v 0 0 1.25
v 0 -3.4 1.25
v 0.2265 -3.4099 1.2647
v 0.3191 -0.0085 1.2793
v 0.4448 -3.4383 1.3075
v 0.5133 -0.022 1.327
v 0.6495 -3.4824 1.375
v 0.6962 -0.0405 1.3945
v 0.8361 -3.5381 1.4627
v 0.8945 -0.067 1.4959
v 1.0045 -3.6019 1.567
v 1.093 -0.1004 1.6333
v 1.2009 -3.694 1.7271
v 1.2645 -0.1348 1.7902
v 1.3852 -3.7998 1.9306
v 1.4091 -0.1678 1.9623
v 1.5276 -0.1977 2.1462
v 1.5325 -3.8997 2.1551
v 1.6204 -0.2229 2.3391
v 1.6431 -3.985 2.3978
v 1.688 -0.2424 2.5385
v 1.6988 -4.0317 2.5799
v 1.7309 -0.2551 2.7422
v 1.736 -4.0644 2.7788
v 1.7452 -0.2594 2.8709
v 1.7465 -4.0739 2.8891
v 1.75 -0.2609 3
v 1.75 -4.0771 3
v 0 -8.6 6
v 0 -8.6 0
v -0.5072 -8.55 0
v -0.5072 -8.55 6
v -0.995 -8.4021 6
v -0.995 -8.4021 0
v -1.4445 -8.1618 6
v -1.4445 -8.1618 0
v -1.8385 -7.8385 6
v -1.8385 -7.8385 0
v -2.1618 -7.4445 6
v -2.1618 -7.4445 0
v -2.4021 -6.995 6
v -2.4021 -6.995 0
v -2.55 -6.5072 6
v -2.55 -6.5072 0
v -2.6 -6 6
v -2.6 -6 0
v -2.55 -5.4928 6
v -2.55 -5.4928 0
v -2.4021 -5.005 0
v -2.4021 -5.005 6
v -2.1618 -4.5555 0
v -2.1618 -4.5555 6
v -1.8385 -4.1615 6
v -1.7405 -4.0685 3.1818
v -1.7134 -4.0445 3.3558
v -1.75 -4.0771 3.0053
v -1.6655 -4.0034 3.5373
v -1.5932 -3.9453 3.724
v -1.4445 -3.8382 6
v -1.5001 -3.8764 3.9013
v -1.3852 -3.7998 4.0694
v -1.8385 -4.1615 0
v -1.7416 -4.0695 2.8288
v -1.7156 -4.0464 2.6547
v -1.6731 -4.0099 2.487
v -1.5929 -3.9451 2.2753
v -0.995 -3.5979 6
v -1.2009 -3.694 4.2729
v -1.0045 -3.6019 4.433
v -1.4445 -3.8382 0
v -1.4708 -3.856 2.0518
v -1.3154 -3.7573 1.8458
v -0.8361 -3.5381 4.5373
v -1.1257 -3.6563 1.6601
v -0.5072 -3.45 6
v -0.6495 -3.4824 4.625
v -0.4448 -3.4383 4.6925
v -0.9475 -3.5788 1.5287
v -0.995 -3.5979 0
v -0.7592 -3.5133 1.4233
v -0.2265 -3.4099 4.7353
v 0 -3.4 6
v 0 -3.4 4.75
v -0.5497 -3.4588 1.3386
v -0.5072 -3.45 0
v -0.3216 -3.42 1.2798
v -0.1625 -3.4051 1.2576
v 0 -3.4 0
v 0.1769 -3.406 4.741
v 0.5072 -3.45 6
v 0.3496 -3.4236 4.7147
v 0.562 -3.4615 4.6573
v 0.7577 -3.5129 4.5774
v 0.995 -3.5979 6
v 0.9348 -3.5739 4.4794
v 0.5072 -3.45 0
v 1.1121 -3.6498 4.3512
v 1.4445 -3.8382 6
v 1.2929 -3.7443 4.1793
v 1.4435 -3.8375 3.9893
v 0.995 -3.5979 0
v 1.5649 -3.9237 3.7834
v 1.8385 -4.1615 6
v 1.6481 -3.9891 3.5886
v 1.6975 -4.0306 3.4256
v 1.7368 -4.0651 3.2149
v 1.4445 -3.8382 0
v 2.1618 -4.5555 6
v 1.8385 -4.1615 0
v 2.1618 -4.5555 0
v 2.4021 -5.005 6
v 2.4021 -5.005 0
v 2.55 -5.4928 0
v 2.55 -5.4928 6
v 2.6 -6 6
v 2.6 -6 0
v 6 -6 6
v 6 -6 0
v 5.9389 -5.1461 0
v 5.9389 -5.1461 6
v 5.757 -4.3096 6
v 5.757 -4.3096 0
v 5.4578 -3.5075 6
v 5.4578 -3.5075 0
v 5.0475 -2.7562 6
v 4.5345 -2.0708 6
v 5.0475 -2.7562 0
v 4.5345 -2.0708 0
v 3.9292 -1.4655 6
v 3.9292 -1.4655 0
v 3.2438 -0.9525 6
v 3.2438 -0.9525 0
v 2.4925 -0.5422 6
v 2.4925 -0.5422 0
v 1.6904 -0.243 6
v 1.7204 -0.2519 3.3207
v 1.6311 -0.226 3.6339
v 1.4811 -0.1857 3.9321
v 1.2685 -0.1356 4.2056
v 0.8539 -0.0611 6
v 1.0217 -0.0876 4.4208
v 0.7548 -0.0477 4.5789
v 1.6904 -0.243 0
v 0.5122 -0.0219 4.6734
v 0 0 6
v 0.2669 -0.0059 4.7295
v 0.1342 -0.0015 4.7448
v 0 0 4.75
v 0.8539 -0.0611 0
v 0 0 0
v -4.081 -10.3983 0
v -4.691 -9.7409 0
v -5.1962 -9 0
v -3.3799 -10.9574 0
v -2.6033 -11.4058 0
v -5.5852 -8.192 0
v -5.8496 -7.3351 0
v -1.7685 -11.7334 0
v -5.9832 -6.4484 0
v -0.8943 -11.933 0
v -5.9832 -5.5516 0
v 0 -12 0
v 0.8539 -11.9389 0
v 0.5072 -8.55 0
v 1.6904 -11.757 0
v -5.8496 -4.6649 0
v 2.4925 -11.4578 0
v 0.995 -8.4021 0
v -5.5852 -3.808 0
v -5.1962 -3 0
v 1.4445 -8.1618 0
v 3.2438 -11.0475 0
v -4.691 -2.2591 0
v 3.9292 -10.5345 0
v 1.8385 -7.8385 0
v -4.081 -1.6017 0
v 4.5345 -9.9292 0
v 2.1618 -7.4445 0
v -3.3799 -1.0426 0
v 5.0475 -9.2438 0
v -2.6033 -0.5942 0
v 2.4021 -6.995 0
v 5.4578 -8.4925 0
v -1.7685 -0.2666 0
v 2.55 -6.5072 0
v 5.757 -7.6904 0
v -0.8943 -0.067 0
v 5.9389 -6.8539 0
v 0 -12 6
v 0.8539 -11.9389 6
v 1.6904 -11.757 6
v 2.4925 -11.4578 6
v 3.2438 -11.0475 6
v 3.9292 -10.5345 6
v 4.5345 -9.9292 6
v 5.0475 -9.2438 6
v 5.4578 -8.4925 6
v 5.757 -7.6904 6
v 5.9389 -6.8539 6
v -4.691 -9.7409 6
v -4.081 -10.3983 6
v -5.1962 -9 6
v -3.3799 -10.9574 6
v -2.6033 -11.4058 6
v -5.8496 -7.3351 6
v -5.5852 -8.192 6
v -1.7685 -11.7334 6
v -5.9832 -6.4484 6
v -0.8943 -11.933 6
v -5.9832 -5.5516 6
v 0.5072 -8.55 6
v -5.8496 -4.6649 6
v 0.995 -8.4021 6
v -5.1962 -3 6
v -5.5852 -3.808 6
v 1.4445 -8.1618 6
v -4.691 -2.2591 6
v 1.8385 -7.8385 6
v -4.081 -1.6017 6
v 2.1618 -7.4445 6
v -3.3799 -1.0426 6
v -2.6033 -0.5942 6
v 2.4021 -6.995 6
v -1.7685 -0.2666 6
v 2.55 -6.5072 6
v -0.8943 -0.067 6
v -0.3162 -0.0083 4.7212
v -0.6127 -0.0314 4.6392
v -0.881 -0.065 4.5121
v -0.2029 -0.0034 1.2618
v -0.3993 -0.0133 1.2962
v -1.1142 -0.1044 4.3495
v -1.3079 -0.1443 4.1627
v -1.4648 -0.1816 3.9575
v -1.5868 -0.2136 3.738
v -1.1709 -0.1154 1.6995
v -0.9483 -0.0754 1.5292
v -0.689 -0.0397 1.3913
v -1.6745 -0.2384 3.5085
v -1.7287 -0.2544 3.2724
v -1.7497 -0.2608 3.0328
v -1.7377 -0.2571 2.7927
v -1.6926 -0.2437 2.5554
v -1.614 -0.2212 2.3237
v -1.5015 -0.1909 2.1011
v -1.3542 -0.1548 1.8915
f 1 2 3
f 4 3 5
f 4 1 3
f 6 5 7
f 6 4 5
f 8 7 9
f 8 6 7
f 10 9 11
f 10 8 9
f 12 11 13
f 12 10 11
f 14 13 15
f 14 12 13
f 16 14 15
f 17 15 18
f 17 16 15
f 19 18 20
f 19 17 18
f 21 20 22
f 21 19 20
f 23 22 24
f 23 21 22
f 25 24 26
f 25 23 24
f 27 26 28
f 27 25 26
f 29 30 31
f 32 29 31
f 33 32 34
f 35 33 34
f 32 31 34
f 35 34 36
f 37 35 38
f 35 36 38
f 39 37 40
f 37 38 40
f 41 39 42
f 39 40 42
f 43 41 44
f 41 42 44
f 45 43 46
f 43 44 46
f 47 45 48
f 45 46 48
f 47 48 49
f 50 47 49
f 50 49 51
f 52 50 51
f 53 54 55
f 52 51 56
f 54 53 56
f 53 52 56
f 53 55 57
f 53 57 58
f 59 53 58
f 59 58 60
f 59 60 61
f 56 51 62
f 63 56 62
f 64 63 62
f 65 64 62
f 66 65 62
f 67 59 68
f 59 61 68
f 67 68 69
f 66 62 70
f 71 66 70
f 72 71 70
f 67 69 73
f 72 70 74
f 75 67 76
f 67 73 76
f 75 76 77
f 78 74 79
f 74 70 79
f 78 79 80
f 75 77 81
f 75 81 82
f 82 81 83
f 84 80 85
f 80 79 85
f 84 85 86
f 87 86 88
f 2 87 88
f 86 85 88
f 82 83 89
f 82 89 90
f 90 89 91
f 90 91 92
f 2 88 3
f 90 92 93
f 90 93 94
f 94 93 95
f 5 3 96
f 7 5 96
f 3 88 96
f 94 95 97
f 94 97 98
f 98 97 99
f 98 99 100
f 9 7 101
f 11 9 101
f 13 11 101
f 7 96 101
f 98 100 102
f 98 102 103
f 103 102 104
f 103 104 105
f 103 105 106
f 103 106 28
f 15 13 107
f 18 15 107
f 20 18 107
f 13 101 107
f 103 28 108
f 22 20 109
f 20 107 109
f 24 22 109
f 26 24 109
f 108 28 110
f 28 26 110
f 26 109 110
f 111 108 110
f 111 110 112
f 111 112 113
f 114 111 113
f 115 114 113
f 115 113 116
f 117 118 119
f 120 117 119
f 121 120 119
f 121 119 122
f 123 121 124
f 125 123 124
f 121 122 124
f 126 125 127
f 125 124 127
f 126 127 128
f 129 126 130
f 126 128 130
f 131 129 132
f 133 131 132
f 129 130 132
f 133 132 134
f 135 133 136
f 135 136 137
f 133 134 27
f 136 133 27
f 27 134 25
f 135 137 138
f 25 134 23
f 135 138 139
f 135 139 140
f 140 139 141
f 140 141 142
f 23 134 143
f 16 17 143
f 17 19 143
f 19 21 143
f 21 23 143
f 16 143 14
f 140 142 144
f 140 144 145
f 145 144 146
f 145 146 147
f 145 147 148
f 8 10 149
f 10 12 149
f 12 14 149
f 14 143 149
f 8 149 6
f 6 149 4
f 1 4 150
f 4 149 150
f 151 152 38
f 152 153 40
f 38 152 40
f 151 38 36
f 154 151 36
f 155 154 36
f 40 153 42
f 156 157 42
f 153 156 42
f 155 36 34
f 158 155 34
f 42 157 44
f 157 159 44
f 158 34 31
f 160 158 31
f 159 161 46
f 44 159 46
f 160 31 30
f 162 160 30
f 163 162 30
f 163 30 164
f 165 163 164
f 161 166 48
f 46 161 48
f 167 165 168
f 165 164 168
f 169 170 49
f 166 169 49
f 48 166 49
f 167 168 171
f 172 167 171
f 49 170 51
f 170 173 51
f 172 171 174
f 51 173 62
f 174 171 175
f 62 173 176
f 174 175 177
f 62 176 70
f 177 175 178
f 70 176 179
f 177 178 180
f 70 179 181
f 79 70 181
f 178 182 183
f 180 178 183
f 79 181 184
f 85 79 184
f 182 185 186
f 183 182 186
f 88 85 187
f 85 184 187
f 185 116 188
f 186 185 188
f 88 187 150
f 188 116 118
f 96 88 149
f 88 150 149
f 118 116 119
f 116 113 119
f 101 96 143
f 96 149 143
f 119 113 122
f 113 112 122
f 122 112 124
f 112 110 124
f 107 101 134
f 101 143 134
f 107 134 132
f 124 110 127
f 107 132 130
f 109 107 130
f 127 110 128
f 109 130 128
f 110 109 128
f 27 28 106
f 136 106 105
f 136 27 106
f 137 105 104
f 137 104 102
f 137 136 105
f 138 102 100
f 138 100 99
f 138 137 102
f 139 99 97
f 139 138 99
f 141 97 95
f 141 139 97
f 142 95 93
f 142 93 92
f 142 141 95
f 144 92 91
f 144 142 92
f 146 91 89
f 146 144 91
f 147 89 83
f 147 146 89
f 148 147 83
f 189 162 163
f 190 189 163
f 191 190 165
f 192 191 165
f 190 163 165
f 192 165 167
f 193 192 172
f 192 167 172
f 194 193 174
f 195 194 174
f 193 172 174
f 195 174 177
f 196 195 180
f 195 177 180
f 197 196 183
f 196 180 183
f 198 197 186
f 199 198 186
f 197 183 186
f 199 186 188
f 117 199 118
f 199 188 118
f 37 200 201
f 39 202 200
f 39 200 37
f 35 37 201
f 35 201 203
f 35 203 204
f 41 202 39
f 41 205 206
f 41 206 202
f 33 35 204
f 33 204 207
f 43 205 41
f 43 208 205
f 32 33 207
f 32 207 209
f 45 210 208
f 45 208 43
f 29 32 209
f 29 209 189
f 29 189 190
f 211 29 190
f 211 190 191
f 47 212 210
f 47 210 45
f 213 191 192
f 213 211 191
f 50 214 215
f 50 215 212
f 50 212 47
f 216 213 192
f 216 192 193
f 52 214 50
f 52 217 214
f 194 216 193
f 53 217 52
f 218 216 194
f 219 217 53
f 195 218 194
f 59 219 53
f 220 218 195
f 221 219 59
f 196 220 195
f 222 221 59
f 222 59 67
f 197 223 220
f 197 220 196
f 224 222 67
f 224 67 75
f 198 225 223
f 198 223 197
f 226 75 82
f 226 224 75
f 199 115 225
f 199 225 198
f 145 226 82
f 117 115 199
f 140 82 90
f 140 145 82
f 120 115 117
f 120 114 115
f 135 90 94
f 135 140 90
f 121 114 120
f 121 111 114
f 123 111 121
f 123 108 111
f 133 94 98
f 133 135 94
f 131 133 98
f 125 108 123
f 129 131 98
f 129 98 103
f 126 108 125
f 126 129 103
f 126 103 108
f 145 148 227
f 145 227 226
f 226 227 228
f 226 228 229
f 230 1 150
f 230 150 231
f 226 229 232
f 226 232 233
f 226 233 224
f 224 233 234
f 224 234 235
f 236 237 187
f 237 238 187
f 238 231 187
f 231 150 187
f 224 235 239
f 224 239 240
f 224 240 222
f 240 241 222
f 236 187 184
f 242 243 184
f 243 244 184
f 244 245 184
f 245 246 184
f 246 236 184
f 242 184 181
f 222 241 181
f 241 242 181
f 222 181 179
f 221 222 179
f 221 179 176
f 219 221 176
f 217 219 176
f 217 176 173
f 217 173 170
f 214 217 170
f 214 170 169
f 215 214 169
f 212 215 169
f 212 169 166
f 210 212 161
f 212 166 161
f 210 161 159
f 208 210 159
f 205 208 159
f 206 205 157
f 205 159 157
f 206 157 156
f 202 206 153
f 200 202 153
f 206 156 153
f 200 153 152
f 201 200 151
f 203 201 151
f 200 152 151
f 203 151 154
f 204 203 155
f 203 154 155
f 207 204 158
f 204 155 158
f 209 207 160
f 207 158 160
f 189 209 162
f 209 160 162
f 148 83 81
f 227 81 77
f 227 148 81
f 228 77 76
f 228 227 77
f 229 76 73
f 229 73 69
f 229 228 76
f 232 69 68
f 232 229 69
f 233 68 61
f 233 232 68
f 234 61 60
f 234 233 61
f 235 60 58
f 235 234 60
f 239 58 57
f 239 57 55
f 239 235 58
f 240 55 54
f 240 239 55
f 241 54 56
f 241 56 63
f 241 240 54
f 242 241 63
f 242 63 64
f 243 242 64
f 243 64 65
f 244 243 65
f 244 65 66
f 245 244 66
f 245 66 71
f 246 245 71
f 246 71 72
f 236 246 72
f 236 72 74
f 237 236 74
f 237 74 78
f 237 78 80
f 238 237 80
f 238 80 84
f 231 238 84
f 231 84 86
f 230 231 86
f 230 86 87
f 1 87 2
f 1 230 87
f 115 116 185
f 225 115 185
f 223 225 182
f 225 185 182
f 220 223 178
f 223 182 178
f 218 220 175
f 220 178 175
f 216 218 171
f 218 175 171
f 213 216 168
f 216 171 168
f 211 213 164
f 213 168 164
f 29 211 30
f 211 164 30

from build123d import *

# Parameters (mm, degrees)
F1_DEPTH = 6
F3_DEPTH = 5.9


with BuildPart() as f1:
    # F0 (on Top) → F1 (new body)
    with BuildSketch(Plane.XY):
        with BuildLine():
            ThreePointArc((6, -6), (4.2426406871, -1.7573593129), (0, 0))
            Line((0, 0), (0, -3.4))
            ThreePointArc((0, -3.4), (1.8384776311, -4.1615223689), (2.6, -6))
            ThreePointArc((2.6, -6), (1.8384776311, -7.8384776311), (0, -8.6))
            Line((0, -8.6), (0, -12))
            ThreePointArc((0, -12), (4.2426406871, -10.2426406871), (6, -6))
        make_face()
        with BuildLine():
            Line((0, -3.4), (0, 0))
            ThreePointArc((0, 0), (-6, -6), (0, -12))
            Line((0, -12), (0, -8.6))
            ThreePointArc((0, -8.6), (-2.6, -6), (0, -3.4))
        make_face()
    extrude(amount=F1_DEPTH)

    # F2 (on Front) → F3 (cut)
    with BuildSketch(Plane.XZ):
        with BuildLine():
            ThreePointArc((0, 4.75), (-1.75, 3), (0, 1.25))
            Line((0, 1.25), (0, 4.75))
        make_face()
        with BuildLine():
            Line((0, 4.75), (0, 1.25))
            ThreePointArc((0, 1.25), (1.2374368671, 1.7625631329), (1.75, 3))
            ThreePointArc((1.75, 3), (1.2374368671, 4.2374368671), (0, 4.75))
        make_face()
    extrude(amount=F3_DEPTH, mode=Mode.SUBTRACT)


solid = f1.part
